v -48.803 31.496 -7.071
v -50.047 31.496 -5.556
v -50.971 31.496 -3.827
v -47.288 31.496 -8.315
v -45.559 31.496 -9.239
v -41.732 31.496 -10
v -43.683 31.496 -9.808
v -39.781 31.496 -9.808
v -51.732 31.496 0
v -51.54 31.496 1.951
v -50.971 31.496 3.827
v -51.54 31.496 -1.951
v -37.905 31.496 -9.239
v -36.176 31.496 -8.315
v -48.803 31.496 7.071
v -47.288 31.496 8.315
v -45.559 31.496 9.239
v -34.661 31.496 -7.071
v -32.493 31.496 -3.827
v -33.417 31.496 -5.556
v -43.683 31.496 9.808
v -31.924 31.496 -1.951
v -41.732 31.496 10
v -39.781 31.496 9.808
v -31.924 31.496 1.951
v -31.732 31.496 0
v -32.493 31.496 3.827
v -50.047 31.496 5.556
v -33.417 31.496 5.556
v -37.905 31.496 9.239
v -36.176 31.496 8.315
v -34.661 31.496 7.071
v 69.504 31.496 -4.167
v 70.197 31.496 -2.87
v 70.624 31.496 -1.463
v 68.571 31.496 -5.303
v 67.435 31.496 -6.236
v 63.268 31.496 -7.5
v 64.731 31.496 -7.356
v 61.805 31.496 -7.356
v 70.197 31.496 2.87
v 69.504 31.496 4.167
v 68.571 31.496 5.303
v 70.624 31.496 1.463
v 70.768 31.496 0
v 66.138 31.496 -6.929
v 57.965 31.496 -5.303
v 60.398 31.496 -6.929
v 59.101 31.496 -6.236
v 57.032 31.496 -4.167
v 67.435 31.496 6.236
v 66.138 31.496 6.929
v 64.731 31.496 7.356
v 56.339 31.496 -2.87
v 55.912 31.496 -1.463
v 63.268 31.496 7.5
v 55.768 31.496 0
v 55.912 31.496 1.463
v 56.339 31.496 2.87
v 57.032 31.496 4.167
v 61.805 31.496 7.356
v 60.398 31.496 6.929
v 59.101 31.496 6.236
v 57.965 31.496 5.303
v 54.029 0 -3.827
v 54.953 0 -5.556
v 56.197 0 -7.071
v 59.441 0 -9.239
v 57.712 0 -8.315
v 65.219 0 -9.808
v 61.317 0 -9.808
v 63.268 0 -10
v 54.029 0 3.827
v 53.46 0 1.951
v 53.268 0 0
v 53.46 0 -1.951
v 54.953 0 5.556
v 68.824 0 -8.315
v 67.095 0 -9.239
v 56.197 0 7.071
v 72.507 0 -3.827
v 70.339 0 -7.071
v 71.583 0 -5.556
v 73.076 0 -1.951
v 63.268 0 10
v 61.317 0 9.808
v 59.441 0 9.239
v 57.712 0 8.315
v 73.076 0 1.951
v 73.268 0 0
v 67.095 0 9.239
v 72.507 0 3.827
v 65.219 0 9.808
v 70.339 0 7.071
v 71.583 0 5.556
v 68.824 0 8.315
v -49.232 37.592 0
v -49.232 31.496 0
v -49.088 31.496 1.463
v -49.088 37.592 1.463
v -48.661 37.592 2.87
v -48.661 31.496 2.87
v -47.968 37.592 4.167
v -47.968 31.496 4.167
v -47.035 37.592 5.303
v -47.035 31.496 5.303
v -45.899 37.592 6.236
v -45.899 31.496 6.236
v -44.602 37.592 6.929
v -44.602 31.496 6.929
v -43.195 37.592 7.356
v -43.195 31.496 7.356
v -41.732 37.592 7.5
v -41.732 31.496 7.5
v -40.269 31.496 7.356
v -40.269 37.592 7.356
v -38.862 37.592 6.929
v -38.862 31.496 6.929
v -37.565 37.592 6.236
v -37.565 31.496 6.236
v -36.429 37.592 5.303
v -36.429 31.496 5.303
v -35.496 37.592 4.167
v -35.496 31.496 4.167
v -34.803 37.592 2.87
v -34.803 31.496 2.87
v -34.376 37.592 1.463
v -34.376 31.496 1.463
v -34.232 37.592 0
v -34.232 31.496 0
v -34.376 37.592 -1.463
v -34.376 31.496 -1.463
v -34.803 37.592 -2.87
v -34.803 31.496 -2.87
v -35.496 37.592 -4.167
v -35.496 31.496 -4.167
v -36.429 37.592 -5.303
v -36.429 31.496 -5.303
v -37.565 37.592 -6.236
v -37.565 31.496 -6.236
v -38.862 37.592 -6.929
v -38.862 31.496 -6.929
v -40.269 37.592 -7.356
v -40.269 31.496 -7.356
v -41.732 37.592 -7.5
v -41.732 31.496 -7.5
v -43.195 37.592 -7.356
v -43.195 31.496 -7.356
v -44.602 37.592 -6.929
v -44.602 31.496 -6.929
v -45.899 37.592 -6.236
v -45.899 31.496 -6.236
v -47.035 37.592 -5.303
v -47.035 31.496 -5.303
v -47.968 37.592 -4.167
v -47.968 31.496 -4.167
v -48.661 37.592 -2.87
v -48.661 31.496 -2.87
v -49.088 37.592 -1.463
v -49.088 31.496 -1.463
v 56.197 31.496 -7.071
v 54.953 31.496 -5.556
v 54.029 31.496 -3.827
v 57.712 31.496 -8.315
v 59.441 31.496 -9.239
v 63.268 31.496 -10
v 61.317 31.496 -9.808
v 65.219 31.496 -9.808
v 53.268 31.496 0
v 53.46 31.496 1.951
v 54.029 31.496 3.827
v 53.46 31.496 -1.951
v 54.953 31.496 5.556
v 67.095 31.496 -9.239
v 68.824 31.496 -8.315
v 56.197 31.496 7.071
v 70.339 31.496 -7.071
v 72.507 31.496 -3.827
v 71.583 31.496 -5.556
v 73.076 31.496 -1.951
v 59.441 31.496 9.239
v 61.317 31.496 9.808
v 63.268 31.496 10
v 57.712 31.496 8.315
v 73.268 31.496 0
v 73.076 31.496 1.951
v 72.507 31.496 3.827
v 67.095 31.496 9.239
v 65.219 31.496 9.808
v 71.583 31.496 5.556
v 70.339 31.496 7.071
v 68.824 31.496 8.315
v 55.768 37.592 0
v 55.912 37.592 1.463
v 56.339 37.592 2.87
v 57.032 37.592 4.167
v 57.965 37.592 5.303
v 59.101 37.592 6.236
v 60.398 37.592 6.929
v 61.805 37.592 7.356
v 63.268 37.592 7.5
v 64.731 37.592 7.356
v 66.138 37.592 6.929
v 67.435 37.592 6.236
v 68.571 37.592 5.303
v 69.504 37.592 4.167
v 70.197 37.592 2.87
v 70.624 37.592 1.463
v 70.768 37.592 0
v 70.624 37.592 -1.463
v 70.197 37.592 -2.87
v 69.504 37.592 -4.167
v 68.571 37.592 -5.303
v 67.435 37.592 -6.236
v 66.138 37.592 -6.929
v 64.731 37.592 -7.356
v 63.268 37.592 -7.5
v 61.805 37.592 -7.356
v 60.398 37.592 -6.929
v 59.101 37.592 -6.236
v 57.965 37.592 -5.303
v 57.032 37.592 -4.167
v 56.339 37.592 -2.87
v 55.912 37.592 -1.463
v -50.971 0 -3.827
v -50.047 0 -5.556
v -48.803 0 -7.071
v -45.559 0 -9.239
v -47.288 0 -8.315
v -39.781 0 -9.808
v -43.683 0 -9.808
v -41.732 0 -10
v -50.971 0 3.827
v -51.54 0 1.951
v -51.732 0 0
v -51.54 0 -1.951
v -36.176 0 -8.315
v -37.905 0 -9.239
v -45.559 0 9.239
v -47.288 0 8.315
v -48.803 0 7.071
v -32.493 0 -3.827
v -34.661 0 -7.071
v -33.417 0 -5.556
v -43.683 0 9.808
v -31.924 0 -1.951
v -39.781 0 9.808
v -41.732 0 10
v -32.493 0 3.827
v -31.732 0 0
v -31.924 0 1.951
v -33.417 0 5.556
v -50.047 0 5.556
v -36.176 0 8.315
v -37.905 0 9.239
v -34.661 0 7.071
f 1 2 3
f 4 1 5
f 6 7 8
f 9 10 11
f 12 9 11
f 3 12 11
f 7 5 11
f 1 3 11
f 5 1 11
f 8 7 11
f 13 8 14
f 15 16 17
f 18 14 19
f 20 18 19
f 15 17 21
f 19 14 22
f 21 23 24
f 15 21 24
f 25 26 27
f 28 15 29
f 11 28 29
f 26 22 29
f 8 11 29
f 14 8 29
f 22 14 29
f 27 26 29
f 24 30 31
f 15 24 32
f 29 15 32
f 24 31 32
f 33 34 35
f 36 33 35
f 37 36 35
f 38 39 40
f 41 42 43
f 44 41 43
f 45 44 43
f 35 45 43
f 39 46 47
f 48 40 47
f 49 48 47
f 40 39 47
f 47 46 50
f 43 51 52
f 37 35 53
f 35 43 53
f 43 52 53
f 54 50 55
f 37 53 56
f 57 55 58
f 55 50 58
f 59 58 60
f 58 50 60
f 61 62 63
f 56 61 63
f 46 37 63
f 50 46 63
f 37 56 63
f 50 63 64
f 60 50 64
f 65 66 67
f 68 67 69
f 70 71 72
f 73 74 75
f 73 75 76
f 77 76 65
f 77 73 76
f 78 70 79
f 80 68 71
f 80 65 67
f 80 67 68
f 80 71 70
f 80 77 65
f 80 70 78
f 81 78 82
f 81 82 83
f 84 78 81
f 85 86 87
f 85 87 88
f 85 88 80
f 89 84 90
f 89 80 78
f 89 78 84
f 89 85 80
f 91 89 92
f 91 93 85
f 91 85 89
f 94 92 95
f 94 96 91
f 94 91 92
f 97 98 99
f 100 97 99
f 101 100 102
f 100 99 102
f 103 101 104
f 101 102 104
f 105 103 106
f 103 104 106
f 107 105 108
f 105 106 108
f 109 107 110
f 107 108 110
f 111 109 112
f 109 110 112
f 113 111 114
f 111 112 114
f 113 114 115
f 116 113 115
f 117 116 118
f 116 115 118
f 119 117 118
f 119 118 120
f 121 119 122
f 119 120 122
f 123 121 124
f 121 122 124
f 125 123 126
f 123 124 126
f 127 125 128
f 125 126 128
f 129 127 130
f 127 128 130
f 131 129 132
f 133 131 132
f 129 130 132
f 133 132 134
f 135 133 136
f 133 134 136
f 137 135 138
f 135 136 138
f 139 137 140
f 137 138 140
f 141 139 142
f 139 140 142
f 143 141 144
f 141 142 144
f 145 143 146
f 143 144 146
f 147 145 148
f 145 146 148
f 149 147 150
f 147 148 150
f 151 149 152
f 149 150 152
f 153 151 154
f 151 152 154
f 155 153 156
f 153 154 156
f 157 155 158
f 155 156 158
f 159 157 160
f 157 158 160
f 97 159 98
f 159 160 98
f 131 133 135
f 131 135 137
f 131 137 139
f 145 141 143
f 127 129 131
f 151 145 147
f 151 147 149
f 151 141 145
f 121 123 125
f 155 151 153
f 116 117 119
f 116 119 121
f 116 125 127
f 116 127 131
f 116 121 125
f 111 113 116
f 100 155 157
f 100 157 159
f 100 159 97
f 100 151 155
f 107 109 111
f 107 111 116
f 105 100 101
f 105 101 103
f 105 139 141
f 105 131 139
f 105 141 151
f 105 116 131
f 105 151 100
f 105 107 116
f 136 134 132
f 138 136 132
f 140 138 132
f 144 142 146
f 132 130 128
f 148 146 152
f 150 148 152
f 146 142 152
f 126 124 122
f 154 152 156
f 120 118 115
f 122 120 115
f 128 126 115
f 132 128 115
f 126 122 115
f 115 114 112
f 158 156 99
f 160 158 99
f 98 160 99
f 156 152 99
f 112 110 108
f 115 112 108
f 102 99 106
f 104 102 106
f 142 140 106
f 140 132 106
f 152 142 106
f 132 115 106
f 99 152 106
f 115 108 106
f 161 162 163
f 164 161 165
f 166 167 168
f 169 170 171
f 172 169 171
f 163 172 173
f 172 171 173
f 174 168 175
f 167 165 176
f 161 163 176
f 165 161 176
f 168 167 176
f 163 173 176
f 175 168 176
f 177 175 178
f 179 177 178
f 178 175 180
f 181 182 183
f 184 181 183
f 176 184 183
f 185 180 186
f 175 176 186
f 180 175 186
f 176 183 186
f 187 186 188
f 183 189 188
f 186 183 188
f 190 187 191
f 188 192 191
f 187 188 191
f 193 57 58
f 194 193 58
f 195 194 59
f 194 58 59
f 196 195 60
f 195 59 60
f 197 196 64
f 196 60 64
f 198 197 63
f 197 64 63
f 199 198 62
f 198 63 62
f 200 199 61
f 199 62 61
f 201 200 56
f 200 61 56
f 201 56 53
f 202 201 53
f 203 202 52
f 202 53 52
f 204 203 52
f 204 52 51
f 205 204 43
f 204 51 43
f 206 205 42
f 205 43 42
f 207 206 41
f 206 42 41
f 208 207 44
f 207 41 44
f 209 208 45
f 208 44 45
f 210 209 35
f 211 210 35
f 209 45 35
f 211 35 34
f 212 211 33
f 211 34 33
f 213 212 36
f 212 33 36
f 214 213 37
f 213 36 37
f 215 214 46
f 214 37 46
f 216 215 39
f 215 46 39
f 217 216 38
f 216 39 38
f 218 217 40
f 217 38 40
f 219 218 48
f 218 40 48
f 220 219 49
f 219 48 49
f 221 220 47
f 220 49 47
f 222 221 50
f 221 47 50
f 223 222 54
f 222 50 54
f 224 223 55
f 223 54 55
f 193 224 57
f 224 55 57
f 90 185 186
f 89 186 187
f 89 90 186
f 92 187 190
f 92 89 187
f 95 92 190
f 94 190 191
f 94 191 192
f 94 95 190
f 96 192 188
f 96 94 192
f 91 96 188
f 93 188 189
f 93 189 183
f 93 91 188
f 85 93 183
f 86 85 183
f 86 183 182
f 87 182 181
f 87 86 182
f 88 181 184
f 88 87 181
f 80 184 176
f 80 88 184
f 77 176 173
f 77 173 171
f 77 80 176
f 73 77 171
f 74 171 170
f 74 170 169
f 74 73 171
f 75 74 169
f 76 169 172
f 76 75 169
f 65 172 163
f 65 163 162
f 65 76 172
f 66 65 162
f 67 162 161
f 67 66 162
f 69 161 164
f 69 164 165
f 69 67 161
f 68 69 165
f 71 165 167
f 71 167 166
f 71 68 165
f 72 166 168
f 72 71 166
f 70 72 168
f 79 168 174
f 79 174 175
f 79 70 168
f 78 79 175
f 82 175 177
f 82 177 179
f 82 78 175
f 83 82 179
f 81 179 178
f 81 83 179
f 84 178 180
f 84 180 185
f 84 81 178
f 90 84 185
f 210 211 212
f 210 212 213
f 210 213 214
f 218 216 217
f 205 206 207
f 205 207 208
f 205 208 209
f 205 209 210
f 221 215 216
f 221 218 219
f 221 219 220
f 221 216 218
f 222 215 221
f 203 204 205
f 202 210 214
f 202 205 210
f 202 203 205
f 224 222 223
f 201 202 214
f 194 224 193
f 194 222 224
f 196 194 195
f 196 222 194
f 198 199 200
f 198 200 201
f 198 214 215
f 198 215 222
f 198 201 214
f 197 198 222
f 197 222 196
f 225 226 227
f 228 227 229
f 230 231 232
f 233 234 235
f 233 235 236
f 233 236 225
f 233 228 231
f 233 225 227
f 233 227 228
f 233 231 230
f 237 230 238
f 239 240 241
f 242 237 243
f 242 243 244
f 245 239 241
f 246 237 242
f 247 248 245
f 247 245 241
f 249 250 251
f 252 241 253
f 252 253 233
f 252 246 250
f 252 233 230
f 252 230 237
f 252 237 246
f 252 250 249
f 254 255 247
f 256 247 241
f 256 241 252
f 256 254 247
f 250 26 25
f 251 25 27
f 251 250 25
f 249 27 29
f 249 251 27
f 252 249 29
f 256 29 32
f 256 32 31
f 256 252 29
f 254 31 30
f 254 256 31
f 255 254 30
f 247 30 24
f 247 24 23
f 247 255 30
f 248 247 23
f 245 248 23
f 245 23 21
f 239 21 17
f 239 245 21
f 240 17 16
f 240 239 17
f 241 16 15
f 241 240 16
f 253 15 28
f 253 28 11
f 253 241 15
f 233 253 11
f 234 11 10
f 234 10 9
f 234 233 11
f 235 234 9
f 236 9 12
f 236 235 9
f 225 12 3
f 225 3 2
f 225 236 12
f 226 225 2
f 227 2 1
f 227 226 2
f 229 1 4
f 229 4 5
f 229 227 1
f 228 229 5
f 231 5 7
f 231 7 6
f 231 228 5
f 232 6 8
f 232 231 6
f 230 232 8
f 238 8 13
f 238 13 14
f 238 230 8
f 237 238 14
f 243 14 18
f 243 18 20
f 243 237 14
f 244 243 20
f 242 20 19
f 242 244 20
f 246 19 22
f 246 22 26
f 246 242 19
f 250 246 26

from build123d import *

# Parameters (mm, degrees)
F0_R     = 10
F1_DEPTH = 31.496
F2_R     = 7.5
F3_DEPTH = 6.096


with BuildPart() as f1:
    # F0 (on Front) → F1 (new body)
    with BuildSketch(Plane.XZ):
        with Locations((-41.731834, 0)):
            Circle(F0_R)
        with Locations((63.268166, 0)):
            Circle(F0_R)
    extrude(amount=-F1_DEPTH)


with BuildPart() as f3:
    # F2 (on face) → F3 (new body)
    with BuildSketch(Plane(origin=(0, 31.496, 0), x_dir=(-1, 0, 0), z_dir=(0, 1, 0))):
        with Locations((41.731834, 0)):
            Circle(F2_R)
        with Locations((-63.268166, 0)):
            Circle(F2_R)
    extrude(amount=F3_DEPTH)


solid = Compound([f1.part, f3.part])
